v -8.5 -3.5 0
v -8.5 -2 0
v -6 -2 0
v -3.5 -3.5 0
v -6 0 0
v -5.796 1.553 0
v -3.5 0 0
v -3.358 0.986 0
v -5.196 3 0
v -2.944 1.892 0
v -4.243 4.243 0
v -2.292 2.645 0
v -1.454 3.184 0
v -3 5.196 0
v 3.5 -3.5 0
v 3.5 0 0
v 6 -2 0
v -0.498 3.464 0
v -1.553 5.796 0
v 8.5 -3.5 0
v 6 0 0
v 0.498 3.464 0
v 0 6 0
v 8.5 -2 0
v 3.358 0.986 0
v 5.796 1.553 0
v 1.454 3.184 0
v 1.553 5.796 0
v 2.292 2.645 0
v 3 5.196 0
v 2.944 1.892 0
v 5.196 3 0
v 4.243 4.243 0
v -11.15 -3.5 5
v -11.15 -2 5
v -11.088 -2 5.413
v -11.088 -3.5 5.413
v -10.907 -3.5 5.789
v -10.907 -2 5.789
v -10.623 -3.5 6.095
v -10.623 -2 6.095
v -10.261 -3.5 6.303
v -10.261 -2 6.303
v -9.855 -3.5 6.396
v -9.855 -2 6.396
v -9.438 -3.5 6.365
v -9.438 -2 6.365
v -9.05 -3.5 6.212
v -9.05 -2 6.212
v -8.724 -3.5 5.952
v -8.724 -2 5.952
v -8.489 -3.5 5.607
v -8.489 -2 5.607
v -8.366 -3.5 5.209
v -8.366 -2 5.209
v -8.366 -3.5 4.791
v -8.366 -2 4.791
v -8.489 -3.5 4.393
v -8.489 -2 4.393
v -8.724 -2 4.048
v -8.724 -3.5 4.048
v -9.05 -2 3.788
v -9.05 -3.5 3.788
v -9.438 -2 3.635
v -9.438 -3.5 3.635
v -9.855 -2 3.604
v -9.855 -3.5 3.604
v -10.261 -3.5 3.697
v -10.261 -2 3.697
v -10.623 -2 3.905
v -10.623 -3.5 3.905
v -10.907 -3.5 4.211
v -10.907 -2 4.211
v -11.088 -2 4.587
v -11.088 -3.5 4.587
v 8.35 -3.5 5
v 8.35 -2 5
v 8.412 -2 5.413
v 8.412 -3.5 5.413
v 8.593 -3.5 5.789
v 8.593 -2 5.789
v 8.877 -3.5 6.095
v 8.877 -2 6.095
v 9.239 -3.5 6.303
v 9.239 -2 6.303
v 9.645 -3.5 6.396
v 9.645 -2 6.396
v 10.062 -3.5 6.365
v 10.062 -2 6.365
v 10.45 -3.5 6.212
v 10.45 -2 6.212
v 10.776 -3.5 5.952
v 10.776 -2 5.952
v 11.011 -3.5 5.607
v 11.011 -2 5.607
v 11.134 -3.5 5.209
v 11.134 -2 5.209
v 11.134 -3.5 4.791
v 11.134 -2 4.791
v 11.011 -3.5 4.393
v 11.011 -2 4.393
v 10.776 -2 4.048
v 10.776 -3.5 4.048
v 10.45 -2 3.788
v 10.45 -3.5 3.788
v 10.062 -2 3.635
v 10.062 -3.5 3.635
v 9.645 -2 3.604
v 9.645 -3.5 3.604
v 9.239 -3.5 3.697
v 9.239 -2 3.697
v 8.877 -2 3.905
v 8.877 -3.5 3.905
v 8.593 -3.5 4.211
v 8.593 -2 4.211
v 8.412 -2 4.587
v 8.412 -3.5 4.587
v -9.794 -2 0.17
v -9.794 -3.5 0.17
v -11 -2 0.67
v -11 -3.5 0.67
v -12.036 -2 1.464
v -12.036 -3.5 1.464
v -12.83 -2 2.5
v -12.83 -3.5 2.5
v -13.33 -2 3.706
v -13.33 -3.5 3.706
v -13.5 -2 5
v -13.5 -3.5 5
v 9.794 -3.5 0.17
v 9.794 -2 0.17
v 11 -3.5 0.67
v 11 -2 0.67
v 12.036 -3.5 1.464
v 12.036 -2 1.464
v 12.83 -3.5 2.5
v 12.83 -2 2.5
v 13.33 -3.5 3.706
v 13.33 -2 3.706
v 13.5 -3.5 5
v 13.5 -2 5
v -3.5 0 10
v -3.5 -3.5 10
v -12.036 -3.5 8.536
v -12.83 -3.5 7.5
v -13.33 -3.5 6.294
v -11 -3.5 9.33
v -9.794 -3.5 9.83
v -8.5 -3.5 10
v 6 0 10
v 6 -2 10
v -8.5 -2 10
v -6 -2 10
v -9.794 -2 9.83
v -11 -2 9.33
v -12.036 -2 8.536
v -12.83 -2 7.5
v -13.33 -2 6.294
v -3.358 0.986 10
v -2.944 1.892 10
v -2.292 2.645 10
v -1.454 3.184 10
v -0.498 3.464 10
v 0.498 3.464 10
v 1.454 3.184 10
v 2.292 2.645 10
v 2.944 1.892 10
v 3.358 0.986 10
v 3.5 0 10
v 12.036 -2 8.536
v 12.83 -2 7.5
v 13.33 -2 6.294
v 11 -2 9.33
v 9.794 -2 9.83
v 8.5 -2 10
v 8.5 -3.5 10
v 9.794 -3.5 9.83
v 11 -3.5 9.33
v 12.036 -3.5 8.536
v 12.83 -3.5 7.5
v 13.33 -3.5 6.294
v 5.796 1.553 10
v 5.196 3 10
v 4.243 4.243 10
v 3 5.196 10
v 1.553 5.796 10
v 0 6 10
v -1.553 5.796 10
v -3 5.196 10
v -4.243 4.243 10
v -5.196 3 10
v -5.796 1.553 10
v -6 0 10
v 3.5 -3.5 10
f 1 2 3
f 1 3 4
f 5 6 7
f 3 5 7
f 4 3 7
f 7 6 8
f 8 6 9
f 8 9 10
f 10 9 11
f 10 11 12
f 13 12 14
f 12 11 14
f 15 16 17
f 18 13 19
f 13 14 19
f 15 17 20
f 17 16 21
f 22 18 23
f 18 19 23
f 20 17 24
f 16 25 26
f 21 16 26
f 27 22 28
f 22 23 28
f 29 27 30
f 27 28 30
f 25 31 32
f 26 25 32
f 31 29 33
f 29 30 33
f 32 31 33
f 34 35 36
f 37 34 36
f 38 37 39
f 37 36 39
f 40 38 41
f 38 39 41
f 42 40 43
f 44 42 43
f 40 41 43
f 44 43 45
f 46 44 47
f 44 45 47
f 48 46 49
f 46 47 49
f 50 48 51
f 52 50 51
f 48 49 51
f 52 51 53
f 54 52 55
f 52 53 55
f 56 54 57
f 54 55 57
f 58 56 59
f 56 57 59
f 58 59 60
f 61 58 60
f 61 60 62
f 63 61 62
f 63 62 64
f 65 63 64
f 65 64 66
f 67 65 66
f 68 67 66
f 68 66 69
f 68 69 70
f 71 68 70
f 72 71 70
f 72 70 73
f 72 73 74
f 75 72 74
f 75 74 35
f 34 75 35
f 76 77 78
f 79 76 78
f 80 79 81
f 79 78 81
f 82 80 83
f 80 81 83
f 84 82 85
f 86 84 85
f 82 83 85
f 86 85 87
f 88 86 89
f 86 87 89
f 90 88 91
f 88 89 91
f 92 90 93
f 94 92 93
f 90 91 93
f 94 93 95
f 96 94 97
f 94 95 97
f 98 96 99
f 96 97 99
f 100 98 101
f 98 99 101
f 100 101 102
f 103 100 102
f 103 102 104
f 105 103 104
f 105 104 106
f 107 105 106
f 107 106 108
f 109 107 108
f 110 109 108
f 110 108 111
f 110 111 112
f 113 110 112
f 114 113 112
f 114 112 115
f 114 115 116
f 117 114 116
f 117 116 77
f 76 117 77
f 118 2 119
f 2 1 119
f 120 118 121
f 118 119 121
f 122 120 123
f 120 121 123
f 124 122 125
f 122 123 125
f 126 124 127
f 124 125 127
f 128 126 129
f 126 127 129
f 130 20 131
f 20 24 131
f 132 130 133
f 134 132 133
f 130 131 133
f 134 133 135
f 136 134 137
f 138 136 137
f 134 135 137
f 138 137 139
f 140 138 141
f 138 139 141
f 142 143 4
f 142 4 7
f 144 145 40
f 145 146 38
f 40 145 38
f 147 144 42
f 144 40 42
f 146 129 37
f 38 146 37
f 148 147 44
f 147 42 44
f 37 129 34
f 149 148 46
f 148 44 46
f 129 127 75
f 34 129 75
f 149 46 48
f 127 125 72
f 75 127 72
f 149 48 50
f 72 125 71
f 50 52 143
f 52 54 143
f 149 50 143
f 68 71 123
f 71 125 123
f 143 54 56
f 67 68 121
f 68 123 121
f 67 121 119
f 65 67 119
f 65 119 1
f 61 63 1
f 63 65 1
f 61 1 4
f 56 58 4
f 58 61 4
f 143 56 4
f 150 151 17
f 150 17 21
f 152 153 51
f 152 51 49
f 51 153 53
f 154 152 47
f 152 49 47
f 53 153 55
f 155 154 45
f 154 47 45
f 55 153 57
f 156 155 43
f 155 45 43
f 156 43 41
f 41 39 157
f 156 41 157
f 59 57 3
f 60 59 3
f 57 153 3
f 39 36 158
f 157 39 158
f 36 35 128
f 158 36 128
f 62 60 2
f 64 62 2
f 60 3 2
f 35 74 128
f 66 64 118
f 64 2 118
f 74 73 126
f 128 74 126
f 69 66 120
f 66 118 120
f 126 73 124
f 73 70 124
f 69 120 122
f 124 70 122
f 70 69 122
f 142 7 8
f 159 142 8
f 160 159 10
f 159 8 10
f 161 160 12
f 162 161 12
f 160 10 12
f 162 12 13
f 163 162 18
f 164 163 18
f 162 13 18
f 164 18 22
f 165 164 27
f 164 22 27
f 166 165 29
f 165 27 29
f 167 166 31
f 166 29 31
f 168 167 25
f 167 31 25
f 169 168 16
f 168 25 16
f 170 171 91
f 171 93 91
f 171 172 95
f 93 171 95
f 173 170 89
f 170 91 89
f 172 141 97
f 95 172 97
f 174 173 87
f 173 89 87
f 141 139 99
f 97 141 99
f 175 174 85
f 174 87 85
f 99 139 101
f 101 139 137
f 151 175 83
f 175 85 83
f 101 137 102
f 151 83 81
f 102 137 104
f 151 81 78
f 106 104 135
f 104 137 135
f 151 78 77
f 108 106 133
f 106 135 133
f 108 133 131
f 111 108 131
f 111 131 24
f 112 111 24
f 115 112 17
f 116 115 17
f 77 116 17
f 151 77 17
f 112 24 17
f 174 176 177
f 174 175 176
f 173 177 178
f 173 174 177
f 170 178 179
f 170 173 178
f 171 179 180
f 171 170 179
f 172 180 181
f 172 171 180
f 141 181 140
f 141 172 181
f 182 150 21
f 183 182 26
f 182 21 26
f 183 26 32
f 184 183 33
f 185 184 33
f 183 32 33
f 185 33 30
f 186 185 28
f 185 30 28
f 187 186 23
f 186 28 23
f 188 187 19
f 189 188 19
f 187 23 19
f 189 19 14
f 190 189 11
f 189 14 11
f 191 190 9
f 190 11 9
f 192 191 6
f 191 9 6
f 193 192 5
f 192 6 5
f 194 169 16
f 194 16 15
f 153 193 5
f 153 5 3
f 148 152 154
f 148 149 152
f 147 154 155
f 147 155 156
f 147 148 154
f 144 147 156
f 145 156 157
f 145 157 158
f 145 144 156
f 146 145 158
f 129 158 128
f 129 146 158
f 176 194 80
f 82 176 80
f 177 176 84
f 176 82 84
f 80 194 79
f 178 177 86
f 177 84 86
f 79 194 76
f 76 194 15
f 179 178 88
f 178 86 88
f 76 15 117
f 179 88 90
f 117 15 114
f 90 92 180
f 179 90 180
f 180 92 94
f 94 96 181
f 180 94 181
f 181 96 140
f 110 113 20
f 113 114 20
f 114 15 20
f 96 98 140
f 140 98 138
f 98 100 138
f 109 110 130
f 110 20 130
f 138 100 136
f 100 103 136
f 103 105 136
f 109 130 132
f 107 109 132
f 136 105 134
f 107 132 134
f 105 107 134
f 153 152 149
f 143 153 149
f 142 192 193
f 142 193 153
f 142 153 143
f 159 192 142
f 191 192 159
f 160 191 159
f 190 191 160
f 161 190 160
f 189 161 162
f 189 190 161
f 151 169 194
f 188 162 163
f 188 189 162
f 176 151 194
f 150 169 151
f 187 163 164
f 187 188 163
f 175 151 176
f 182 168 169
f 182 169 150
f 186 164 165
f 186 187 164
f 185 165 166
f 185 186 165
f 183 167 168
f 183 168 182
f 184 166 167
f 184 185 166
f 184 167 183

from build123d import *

# Parameters (mm, degrees)
F1_DEPTH = 10
F2_R     = 1.4
F3_DEPTH = 25
F4_R     = 4.99999


# Not quite as in the source:
# - a fillet or chamfer is up to 0.001 mm smaller than in the source, because OpenCascade refuses the exact size


with BuildPart() as f1:
    # F0 (on Top) → F1 (new body)
    with BuildSketch(Plane.XY):
        with BuildLine():
            ThreePointArc((-3.5, 0), (0, 3.5), (3.5, 0))
            Line((3.5, 0), (3.5, -3.5))
            Line((3.5, -3.5), (13.5, -3.5))
            Line((13.5, -3.5), (13.5, -2))
            Line((13.5, -2), (6, -2))
            Line((6, -2), (6, 0))
            ThreePointArc((6, 0), (0, 6), (-6, 0))
            Line((-6, 0), (-6, -2))
            Line((-6, -2), (-13.5, -2))
            Line((-13.5, -2), (-13.5, -3.5))
            Line((-13.5, -3.5), (-3.5, -3.5))
            Line((-3.5, -3.5), (-3.5, 0))
        make_face()
    extrude(amount=F1_DEPTH)

    # F2 (on face) → F3 (cut)
    with BuildSketch(Plane(origin=(0, -2, 0), x_dir=(-1, 0, 0), z_dir=(0, 1, 0))):
        with Locations((9.75, 5)):
            Circle(F2_R)
        with Locations((-9.75, 5)):
            Circle(F2_R)
    extrude(amount=-F3_DEPTH, mode=Mode.SUBTRACT)

    # F4 (radius 5 in the source; OpenCascade refuses exactly that, so slightly less here)
    f4_edges = [f1.edges().sort_by_distance(p)[0] for p in [
        (-13.5, -2.75, 10),
        (13.5, -2.75, 10),
        (-13.5, -2.75, 0),
        (13.5, -2.75, 0),
    ]]
    fillet(f4_edges, radius=F4_R)


solid = f1.part
